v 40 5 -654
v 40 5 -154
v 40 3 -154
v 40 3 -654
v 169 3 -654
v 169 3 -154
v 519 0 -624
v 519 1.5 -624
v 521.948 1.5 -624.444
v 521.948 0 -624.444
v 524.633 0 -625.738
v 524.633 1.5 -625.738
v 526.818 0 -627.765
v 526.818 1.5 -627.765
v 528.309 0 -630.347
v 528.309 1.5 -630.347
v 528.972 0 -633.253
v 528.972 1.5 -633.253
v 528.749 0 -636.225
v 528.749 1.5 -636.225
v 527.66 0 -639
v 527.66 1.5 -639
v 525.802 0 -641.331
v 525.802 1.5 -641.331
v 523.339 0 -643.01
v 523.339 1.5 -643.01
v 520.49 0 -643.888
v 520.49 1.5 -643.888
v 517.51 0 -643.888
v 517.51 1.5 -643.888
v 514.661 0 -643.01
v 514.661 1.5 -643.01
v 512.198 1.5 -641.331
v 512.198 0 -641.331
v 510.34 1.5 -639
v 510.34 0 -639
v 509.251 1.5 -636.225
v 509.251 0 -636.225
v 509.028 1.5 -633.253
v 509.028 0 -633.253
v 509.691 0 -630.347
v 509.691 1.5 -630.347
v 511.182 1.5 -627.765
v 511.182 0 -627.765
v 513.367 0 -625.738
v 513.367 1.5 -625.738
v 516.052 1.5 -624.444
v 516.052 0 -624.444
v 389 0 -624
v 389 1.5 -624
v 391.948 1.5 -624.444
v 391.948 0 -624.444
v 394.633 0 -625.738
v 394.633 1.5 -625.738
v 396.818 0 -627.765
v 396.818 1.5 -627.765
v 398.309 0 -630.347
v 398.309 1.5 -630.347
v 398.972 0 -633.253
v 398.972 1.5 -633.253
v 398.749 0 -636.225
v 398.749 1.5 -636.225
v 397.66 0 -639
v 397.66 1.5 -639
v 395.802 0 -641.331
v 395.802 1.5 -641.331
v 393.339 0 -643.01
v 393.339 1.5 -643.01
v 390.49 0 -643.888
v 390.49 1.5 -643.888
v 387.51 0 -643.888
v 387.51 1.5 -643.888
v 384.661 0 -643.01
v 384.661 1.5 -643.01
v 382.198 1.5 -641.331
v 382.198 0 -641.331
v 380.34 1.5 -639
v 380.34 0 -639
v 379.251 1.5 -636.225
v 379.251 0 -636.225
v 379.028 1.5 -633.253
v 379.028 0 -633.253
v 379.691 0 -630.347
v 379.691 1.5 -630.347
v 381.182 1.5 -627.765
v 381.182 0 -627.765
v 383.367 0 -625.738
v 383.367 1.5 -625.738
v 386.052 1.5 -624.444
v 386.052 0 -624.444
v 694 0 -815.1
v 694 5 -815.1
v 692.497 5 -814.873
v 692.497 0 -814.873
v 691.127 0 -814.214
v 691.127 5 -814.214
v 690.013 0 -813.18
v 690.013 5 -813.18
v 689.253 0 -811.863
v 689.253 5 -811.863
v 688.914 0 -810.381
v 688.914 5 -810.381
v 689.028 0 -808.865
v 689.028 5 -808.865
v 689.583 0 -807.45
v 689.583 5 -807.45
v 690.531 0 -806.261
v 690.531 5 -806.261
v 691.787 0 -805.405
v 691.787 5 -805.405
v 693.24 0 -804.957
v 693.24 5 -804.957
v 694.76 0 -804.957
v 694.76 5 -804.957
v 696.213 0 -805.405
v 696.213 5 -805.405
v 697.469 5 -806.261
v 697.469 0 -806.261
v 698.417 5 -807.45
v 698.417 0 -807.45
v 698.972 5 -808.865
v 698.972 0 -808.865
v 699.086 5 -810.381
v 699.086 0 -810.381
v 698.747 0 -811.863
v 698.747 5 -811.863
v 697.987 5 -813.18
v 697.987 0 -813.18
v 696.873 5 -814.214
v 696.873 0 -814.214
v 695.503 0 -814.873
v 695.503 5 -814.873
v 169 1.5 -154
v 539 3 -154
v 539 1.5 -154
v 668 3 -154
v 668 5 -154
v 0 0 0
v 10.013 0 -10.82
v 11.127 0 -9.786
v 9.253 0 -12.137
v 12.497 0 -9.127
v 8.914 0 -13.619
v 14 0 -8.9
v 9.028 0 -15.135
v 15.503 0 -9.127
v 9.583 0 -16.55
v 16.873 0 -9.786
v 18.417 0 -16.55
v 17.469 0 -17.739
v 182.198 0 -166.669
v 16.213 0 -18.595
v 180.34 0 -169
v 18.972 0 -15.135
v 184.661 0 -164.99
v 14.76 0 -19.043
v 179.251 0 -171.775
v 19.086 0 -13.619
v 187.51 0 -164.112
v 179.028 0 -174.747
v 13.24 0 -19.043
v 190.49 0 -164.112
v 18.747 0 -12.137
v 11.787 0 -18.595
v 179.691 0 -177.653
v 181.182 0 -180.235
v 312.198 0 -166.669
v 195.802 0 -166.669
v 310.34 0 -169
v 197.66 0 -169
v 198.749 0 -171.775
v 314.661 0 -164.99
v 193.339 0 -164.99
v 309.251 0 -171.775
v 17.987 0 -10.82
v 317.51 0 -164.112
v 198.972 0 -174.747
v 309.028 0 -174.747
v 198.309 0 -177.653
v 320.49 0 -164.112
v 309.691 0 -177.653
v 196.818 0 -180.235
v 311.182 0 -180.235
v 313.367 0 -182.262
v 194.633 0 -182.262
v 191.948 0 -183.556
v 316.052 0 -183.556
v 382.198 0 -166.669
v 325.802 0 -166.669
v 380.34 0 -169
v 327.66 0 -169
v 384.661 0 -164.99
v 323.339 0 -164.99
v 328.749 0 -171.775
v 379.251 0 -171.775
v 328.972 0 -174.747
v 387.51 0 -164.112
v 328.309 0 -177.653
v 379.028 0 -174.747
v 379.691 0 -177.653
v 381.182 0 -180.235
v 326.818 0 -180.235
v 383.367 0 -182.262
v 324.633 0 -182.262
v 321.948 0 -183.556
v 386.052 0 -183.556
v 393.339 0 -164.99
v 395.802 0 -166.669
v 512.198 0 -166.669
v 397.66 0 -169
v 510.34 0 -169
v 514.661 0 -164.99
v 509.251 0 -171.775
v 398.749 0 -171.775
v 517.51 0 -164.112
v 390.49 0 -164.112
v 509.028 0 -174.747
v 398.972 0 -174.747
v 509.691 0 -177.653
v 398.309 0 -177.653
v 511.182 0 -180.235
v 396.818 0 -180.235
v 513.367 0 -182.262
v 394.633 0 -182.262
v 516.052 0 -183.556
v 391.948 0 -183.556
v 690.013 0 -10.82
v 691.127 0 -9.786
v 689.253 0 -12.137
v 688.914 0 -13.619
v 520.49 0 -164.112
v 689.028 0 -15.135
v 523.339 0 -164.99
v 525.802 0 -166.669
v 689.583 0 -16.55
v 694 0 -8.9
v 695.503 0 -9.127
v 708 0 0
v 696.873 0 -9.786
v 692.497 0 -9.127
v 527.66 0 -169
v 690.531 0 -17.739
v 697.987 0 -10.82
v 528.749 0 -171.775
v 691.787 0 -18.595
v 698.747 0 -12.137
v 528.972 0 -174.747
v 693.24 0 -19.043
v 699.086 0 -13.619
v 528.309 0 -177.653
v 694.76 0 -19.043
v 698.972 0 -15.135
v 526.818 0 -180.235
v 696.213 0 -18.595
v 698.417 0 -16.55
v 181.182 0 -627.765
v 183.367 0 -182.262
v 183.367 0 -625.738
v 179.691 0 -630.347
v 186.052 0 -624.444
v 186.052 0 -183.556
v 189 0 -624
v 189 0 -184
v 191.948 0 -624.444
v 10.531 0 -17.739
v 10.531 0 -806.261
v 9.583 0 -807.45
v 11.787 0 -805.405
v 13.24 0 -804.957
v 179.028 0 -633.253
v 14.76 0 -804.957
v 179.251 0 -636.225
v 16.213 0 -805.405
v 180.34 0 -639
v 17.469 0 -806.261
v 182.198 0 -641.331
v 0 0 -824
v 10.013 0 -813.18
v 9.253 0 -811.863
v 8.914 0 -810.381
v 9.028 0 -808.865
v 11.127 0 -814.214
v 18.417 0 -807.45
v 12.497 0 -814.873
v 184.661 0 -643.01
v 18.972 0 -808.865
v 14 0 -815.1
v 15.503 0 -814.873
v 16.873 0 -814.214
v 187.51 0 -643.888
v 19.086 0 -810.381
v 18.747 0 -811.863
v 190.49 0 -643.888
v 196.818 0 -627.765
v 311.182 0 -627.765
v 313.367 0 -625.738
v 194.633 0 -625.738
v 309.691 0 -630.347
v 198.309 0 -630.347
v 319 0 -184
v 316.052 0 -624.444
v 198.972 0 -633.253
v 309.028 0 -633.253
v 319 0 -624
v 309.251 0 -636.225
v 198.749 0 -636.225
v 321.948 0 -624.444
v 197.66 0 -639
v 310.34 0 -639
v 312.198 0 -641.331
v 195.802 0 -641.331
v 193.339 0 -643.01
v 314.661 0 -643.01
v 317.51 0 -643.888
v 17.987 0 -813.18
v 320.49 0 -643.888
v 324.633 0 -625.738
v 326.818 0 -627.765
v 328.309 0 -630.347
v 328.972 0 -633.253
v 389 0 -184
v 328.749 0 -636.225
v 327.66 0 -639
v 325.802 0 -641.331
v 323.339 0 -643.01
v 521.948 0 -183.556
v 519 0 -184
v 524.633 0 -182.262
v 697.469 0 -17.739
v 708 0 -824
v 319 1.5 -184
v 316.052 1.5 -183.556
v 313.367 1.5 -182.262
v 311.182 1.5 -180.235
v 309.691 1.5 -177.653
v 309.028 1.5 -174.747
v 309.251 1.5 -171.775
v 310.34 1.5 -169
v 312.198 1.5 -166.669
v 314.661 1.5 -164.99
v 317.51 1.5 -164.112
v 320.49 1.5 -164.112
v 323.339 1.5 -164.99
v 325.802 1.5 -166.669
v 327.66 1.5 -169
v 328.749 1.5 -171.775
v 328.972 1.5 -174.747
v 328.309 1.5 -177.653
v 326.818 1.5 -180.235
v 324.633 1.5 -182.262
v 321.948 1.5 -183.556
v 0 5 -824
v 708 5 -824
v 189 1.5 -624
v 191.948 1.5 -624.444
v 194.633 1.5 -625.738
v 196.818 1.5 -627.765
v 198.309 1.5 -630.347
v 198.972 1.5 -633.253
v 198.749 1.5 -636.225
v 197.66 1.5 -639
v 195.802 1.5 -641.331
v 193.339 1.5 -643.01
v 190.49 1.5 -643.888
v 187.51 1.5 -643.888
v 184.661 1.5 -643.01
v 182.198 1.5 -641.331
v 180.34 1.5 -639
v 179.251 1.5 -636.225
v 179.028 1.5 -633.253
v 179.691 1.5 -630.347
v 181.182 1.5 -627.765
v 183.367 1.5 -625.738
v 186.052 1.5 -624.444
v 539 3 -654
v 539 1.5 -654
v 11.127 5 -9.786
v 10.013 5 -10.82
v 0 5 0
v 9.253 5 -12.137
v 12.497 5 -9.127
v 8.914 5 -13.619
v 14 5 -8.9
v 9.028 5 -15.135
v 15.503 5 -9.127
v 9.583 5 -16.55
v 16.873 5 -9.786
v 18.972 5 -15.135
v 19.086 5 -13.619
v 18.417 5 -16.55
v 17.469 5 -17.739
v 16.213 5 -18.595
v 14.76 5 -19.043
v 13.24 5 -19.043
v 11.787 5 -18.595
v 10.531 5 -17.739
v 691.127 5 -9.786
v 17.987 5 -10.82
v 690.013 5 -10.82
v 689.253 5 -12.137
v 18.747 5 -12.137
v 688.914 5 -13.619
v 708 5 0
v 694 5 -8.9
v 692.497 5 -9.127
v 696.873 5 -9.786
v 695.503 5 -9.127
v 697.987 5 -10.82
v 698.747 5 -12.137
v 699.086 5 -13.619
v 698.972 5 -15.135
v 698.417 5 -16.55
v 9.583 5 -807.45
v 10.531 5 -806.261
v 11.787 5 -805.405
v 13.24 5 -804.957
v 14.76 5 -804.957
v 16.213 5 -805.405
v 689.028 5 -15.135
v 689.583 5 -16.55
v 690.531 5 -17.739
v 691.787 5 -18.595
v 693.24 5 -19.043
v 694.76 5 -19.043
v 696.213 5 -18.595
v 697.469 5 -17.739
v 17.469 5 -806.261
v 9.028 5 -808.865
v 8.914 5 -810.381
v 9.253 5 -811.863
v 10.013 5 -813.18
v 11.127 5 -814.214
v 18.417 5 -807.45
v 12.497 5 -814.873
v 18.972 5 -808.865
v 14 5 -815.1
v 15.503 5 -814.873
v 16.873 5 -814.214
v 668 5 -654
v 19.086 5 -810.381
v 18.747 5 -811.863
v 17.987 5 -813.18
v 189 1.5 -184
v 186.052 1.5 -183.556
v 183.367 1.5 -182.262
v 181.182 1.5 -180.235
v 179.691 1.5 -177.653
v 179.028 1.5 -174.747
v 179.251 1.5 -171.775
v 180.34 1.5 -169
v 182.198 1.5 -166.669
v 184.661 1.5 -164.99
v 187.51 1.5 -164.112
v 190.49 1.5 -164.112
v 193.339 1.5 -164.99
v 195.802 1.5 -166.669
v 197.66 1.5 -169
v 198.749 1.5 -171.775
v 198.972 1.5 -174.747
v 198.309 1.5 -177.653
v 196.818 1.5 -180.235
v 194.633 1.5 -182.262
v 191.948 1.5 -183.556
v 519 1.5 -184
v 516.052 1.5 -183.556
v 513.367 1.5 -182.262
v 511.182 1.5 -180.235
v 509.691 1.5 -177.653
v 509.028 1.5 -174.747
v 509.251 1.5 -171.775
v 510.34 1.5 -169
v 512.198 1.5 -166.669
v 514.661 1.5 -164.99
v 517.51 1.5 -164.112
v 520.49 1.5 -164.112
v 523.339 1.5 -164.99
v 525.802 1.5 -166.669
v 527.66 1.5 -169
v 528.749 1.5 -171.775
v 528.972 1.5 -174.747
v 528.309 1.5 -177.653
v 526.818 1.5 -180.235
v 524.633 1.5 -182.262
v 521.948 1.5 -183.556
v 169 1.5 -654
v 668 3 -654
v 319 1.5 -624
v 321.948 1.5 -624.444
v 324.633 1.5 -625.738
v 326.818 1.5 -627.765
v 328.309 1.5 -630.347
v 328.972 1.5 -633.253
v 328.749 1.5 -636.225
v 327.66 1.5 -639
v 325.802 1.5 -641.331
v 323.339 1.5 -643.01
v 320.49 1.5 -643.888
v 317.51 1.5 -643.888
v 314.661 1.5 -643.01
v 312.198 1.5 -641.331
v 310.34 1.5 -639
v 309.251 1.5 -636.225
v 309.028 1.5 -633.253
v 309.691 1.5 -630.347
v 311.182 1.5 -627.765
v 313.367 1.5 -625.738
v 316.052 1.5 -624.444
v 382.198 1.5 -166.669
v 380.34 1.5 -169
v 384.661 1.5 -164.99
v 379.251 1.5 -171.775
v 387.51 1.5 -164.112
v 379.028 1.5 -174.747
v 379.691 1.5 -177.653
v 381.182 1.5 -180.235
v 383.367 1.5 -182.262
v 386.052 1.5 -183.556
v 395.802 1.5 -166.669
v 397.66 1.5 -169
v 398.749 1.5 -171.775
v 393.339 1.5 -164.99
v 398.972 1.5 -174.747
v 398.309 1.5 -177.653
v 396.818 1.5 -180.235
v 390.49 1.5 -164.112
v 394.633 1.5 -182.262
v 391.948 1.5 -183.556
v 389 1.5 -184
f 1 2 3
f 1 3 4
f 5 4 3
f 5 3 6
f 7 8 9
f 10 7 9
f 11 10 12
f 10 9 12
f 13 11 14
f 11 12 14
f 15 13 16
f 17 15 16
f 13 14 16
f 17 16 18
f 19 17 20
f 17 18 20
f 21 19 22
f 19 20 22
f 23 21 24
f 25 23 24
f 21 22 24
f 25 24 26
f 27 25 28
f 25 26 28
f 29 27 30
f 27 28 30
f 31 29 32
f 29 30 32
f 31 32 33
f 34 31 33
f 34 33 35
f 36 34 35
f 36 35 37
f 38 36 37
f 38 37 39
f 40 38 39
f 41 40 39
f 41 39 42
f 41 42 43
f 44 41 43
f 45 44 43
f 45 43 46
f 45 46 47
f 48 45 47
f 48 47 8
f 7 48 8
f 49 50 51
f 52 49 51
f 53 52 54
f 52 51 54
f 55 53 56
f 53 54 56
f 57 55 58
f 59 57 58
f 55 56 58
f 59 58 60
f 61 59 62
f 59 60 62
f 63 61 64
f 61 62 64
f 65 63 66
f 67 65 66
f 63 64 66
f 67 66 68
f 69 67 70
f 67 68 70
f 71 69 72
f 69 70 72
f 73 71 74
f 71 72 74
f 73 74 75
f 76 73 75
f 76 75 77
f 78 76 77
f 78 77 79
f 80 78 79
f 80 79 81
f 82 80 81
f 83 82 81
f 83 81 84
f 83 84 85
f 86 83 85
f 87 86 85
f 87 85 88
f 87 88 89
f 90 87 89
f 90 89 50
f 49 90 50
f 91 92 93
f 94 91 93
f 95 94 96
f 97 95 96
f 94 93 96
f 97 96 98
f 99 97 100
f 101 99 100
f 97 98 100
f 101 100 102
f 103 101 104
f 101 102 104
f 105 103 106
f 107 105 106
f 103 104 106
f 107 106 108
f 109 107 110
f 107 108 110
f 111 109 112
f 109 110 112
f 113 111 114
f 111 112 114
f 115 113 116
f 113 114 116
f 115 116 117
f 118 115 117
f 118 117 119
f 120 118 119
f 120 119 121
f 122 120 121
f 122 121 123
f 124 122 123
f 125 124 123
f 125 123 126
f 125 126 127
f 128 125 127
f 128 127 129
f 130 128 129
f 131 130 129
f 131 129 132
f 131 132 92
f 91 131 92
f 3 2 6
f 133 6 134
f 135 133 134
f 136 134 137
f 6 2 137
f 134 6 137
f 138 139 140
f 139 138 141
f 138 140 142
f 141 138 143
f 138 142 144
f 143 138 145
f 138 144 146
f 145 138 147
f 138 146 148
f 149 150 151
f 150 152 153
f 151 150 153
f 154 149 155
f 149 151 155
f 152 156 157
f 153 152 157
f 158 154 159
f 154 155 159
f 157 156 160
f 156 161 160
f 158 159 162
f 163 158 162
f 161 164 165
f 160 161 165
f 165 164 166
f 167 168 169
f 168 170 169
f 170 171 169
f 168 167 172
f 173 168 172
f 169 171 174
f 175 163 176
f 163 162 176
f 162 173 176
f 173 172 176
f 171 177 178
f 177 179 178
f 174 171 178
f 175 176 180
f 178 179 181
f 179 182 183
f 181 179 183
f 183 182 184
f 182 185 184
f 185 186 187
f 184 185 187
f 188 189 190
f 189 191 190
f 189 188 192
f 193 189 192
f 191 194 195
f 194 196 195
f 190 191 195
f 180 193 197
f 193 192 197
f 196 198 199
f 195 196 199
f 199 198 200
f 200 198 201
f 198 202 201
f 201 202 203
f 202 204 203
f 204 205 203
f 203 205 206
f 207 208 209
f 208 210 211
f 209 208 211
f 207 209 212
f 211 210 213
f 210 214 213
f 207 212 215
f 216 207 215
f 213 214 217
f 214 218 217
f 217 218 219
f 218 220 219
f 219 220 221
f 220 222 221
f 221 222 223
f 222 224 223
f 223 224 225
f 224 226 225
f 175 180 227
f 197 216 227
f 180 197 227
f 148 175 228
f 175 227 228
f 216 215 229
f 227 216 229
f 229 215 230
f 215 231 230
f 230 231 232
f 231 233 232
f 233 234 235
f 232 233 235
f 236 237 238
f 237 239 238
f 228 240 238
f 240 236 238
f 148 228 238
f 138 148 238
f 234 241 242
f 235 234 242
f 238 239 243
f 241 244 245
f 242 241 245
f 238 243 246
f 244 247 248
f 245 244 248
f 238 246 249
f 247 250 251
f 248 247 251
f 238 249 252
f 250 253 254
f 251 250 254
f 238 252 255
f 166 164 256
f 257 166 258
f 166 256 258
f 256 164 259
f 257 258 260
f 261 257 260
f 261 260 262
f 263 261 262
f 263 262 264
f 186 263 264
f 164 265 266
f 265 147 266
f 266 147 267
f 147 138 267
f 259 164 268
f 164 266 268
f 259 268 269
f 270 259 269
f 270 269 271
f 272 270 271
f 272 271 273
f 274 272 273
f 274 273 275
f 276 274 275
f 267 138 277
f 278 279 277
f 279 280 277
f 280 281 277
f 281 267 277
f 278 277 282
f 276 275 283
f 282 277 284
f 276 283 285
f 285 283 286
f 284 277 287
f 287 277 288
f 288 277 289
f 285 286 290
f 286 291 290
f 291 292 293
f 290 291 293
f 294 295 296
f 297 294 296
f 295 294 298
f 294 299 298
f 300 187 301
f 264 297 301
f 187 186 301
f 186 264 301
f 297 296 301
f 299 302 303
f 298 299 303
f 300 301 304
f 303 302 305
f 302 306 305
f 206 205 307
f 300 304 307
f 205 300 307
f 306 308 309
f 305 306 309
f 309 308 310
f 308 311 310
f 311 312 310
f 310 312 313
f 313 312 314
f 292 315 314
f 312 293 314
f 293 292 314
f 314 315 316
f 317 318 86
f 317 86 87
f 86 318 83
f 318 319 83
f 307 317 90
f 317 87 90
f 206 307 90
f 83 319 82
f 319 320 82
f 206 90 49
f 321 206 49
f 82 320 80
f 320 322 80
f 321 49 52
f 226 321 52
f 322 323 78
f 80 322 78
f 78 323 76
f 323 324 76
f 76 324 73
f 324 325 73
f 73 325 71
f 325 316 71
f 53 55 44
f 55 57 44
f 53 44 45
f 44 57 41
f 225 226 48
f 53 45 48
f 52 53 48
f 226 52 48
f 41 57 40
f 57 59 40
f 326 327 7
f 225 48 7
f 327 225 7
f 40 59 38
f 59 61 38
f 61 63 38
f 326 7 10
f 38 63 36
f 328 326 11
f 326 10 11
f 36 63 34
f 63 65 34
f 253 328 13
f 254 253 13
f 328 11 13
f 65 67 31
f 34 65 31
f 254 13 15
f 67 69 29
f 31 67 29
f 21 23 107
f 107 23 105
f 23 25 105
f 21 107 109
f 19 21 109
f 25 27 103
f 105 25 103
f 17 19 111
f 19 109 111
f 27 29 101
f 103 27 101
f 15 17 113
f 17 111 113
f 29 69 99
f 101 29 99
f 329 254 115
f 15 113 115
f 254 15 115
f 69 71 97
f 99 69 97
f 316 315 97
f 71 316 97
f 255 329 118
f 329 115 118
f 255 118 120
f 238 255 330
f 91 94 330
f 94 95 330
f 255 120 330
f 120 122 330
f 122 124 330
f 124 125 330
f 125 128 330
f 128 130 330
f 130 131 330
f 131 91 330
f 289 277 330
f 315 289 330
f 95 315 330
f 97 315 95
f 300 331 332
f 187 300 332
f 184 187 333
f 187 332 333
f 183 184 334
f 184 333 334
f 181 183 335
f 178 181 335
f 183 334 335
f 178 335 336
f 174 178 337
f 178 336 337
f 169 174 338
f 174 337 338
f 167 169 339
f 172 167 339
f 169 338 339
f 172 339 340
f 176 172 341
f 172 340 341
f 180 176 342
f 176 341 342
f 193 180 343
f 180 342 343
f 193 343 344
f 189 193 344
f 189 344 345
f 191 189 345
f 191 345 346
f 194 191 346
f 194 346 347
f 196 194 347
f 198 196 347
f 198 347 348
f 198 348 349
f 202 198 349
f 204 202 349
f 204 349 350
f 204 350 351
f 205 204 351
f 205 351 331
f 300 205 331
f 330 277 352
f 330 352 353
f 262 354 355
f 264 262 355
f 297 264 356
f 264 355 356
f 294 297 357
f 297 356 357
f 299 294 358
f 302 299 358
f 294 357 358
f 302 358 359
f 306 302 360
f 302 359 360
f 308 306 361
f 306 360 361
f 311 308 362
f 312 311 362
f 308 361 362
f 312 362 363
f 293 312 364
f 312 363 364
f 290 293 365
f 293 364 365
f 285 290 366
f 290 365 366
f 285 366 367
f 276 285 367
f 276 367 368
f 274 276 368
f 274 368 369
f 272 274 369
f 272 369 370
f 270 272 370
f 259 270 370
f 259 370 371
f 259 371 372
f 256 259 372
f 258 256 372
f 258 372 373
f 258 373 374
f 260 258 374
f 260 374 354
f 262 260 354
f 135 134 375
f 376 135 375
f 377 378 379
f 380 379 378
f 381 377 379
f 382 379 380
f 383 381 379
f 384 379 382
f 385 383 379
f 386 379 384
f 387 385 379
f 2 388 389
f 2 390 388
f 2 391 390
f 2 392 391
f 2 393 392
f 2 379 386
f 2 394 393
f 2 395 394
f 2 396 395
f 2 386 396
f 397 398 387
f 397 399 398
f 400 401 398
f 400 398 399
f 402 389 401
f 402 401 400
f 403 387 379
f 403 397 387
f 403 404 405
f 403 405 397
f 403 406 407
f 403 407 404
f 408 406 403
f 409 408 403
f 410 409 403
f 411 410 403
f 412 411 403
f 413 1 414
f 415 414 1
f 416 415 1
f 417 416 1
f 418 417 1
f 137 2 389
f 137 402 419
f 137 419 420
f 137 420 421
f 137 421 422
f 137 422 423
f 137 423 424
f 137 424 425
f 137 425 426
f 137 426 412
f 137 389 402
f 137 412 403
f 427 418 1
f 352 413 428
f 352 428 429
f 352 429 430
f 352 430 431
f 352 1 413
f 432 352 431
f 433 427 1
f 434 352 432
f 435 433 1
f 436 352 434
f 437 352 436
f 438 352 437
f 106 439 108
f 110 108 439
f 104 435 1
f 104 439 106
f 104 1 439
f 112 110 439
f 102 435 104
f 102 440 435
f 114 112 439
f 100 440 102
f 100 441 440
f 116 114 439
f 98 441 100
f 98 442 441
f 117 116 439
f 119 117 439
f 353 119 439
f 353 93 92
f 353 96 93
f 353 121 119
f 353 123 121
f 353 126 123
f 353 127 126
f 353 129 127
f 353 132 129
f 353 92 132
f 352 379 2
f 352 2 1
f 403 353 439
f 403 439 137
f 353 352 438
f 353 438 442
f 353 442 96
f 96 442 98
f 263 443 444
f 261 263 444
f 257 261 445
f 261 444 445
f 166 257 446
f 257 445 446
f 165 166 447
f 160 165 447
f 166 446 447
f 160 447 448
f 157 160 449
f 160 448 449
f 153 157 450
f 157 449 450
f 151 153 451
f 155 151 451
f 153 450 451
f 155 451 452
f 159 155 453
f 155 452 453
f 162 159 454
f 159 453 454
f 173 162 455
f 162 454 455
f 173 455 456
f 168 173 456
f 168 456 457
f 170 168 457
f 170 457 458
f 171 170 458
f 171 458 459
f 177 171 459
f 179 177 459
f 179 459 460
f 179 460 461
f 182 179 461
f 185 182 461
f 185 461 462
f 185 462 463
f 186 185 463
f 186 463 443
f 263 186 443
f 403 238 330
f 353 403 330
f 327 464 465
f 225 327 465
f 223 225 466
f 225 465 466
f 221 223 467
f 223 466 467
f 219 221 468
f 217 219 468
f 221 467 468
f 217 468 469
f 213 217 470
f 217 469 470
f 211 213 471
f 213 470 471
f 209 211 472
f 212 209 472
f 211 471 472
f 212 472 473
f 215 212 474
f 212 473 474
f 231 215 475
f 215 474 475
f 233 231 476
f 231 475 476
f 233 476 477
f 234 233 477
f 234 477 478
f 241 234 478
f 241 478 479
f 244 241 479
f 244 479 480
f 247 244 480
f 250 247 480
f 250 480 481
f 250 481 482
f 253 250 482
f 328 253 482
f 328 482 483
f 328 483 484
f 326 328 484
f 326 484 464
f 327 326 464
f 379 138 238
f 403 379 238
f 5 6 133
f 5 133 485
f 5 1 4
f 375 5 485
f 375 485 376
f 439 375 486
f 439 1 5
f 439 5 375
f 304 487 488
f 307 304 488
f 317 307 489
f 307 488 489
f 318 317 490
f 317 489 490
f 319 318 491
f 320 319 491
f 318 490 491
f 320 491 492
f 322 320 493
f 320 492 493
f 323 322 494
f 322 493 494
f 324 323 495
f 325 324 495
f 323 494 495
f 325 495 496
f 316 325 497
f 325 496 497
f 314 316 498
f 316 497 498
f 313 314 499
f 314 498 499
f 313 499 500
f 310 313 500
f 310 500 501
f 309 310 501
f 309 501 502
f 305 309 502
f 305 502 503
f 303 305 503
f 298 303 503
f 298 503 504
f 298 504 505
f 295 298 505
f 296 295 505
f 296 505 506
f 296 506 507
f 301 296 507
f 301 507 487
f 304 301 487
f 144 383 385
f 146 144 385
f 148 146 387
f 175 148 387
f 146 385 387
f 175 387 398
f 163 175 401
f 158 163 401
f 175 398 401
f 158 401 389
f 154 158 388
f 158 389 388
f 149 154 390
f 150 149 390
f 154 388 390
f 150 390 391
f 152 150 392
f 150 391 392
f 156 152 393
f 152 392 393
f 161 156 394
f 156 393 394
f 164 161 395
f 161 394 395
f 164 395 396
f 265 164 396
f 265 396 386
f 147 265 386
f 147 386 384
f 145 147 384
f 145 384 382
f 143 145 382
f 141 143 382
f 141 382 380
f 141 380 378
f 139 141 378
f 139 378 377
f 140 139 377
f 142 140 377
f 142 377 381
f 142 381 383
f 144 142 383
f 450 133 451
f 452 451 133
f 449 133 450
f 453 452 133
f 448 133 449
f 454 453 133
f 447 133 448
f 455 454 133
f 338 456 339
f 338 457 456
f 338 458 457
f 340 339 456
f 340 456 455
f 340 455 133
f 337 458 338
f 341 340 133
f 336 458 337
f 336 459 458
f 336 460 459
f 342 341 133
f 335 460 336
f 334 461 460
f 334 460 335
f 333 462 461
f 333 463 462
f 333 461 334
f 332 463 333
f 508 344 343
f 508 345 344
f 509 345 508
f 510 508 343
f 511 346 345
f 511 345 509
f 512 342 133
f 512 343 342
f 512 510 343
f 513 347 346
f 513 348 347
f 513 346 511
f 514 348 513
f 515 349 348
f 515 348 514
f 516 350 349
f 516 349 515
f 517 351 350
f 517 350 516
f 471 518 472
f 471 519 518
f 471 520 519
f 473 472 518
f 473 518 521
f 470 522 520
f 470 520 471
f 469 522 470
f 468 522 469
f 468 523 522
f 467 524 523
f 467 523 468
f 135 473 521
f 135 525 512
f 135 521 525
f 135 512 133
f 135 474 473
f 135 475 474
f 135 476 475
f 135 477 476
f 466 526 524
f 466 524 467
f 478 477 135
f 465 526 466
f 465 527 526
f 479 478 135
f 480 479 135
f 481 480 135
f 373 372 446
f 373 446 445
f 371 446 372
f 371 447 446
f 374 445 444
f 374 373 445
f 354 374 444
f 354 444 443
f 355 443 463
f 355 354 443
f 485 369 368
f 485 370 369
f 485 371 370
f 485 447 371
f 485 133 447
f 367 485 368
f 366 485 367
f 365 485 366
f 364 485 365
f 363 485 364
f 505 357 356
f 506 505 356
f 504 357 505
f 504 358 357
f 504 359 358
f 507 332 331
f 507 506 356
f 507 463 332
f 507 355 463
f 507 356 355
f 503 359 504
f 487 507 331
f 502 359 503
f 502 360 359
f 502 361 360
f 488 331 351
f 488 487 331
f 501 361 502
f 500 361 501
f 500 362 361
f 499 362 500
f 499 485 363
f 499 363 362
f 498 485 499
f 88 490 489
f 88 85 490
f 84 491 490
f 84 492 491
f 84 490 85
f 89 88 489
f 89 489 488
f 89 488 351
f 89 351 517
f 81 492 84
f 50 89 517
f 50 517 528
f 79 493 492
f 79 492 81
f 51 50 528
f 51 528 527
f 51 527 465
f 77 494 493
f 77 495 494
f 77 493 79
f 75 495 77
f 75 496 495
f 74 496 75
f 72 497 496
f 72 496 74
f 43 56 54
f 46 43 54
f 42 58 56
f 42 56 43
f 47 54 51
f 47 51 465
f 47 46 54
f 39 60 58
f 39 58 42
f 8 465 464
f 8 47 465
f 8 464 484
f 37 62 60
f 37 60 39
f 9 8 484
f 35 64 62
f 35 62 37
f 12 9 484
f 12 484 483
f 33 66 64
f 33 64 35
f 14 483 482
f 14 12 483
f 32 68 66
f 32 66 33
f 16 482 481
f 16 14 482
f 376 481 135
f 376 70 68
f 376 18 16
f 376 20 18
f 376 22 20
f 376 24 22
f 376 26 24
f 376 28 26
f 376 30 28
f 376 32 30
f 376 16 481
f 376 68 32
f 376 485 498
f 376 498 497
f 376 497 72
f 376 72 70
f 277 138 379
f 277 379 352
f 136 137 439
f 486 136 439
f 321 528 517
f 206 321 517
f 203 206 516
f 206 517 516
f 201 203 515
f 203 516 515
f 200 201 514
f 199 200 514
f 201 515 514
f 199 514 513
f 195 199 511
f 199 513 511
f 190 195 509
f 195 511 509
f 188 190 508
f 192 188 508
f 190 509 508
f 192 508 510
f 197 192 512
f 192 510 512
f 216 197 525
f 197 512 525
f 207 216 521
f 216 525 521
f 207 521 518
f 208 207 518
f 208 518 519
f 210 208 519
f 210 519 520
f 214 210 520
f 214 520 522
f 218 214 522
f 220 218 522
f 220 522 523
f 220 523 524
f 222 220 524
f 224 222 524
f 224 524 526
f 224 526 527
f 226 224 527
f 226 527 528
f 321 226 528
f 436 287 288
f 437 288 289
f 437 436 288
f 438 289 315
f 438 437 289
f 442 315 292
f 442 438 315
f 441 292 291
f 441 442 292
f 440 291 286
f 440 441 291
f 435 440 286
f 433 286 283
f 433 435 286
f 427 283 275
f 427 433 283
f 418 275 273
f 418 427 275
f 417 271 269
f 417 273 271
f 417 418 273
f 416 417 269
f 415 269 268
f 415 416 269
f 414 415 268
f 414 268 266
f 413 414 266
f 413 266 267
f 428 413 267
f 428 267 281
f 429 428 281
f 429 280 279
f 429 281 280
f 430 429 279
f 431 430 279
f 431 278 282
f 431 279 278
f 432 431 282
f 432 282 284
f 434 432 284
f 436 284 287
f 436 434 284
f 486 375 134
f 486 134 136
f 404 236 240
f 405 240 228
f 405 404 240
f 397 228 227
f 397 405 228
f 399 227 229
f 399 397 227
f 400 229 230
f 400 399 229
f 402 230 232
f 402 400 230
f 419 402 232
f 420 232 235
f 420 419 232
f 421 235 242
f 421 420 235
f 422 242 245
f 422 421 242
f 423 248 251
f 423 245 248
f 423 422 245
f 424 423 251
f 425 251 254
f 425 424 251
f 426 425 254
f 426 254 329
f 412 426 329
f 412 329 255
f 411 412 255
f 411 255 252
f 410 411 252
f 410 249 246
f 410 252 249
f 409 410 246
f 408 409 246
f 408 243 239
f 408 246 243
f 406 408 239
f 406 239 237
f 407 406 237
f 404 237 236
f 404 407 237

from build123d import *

# Parameters (mm, degrees)
SKETCH1_W                                  = 708
SKETCH1_H                                  = 824
BOSS_EXTRUDE1_DEPTH                        = 5
SKETCH2_W                                  = 370
SKETCH2_H                                  = 500
CUT_EXTRUDE1_DEPTH                         = 3.5
SKETCH3_W                                  = 628
SKETCH3_H                                  = 500
CUT_EXTRUDE2_DEPTH                         = 2
SKETCH11_R                                 = 5.1
CUT_EXTRUDE7_DEPTH                         = 23.2
MIRROR4_AT_THE_SECOND_PLANE_COPY_1_SKETC_R = 5.1
MIRROR4_AT_THE_SECOND_PLANE_COPY_1_DEPTH   = 23.2
SKETCH4_R                                  = 10
CUT_EXTRUDE8_DEPTH                         = 1087.394150389


with BuildPart() as part:
    # Sketch1 → Boss-Extrude1 (new body)
    with BuildSketch(Plane(origin=(0, 0, 0), x_dir=(1, 0, 0), z_dir=(0, 1, 0))):
        with Locations((354, 412)):
            Rectangle(SKETCH1_W, SKETCH1_H)
    extrude(amount=BOSS_EXTRUDE1_DEPTH)

    # Sketch2 → Cut-Extrude1 (cut)
    with BuildSketch(Plane(origin=(0, 5, 0), x_dir=(1, 0, 0), z_dir=(0, 1, 0))):
        with Locations((354, 404)):
            Rectangle(SKETCH2_W, SKETCH2_H)
    extrude(amount=-CUT_EXTRUDE1_DEPTH, mode=Mode.SUBTRACT)

    # Sketch3 → Cut-Extrude2 (cut)
    with BuildSketch(Plane(origin=(0, 5, 0), x_dir=(1, 0, 0), z_dir=(0, 1, 0))):
        with Locations((354, 404)):
            Rectangle(SKETCH3_W, SKETCH3_H)
    extrude(amount=-CUT_EXTRUDE2_DEPTH, mode=Mode.SUBTRACT)

    # Sketch11 → Cut-Extrude7 (cut)
    with BuildSketch(Plane(origin=(0, 5, 0), x_dir=(1, 0, 0), z_dir=(0, 1, 0))):
        with Locations(Location((14, 14, 0), (0, 0, 270))):
            Circle(SKETCH11_R)
    cut_extrude7 = extrude(amount=-CUT_EXTRUDE7_DEPTH, mode=Mode.SUBTRACT)

    # Mirror4: Cut-Extrude7 across plane
    add(cut_extrude7.mirror(Plane(origin=(354, 0, 0), x_dir=(0, 0, 1), z_dir=(1, 0, 0))), mode=Mode.SUBTRACT)

    # Mirror4 at the second plane: Cut-Extrude7 across plane
    add(cut_extrude7.mirror(Plane.XY.offset(-412)), mode=Mode.SUBTRACT)

    # Mirror4 at the second plane copy 1 sketc → Mirror4 at the second plane copy 1 (cut)
    with BuildSketch(Plane(origin=(708, 5, -824), x_dir=(-1, 0, 0), z_dir=(0, 1, 0))):
        with Locations(Location((14, 14, 0), (0, 0, 270))):
            Circle(MIRROR4_AT_THE_SECOND_PLANE_COPY_1_SKETC_R)
    extrude(amount=-MIRROR4_AT_THE_SECOND_PLANE_COPY_1_DEPTH, mode=Mode.SUBTRACT)

    # Sketch4 → Cut-Extrude8 (cut, through all)
    with BuildSketch(Plane(origin=(0, 1.5, 0), x_dir=(1, 0, 0), z_dir=(0, 1, 0))):
        with Locations(Location((189, 634, 0), (0, 0, 270))):
            Circle(SKETCH4_R)
        with Locations(Location((319, 634, 0), (0, 0, 270))):
            Circle(SKETCH4_R)
        with Locations(Location((389, 634, 0), (0, 0, 270))):
            Circle(SKETCH4_R)
        with Locations(Location((519, 634, 0), (0, 0, 270))):
            Circle(SKETCH4_R)
        with Locations(Location((519, 174, 0), (0, 0, 90))):
            Circle(SKETCH4_R)
        with Locations(Location((389, 174, 0), (0, 0, 90))):
            Circle(SKETCH4_R)
        with Locations(Location((319, 174, 0), (0, 0, 90))):
            Circle(SKETCH4_R)
        with Locations(Location((189, 174, 0), (0, 0, 90))):
            Circle(SKETCH4_R)
    extrude(amount=-CUT_EXTRUDE8_DEPTH, mode=Mode.SUBTRACT)


solid = part.part
